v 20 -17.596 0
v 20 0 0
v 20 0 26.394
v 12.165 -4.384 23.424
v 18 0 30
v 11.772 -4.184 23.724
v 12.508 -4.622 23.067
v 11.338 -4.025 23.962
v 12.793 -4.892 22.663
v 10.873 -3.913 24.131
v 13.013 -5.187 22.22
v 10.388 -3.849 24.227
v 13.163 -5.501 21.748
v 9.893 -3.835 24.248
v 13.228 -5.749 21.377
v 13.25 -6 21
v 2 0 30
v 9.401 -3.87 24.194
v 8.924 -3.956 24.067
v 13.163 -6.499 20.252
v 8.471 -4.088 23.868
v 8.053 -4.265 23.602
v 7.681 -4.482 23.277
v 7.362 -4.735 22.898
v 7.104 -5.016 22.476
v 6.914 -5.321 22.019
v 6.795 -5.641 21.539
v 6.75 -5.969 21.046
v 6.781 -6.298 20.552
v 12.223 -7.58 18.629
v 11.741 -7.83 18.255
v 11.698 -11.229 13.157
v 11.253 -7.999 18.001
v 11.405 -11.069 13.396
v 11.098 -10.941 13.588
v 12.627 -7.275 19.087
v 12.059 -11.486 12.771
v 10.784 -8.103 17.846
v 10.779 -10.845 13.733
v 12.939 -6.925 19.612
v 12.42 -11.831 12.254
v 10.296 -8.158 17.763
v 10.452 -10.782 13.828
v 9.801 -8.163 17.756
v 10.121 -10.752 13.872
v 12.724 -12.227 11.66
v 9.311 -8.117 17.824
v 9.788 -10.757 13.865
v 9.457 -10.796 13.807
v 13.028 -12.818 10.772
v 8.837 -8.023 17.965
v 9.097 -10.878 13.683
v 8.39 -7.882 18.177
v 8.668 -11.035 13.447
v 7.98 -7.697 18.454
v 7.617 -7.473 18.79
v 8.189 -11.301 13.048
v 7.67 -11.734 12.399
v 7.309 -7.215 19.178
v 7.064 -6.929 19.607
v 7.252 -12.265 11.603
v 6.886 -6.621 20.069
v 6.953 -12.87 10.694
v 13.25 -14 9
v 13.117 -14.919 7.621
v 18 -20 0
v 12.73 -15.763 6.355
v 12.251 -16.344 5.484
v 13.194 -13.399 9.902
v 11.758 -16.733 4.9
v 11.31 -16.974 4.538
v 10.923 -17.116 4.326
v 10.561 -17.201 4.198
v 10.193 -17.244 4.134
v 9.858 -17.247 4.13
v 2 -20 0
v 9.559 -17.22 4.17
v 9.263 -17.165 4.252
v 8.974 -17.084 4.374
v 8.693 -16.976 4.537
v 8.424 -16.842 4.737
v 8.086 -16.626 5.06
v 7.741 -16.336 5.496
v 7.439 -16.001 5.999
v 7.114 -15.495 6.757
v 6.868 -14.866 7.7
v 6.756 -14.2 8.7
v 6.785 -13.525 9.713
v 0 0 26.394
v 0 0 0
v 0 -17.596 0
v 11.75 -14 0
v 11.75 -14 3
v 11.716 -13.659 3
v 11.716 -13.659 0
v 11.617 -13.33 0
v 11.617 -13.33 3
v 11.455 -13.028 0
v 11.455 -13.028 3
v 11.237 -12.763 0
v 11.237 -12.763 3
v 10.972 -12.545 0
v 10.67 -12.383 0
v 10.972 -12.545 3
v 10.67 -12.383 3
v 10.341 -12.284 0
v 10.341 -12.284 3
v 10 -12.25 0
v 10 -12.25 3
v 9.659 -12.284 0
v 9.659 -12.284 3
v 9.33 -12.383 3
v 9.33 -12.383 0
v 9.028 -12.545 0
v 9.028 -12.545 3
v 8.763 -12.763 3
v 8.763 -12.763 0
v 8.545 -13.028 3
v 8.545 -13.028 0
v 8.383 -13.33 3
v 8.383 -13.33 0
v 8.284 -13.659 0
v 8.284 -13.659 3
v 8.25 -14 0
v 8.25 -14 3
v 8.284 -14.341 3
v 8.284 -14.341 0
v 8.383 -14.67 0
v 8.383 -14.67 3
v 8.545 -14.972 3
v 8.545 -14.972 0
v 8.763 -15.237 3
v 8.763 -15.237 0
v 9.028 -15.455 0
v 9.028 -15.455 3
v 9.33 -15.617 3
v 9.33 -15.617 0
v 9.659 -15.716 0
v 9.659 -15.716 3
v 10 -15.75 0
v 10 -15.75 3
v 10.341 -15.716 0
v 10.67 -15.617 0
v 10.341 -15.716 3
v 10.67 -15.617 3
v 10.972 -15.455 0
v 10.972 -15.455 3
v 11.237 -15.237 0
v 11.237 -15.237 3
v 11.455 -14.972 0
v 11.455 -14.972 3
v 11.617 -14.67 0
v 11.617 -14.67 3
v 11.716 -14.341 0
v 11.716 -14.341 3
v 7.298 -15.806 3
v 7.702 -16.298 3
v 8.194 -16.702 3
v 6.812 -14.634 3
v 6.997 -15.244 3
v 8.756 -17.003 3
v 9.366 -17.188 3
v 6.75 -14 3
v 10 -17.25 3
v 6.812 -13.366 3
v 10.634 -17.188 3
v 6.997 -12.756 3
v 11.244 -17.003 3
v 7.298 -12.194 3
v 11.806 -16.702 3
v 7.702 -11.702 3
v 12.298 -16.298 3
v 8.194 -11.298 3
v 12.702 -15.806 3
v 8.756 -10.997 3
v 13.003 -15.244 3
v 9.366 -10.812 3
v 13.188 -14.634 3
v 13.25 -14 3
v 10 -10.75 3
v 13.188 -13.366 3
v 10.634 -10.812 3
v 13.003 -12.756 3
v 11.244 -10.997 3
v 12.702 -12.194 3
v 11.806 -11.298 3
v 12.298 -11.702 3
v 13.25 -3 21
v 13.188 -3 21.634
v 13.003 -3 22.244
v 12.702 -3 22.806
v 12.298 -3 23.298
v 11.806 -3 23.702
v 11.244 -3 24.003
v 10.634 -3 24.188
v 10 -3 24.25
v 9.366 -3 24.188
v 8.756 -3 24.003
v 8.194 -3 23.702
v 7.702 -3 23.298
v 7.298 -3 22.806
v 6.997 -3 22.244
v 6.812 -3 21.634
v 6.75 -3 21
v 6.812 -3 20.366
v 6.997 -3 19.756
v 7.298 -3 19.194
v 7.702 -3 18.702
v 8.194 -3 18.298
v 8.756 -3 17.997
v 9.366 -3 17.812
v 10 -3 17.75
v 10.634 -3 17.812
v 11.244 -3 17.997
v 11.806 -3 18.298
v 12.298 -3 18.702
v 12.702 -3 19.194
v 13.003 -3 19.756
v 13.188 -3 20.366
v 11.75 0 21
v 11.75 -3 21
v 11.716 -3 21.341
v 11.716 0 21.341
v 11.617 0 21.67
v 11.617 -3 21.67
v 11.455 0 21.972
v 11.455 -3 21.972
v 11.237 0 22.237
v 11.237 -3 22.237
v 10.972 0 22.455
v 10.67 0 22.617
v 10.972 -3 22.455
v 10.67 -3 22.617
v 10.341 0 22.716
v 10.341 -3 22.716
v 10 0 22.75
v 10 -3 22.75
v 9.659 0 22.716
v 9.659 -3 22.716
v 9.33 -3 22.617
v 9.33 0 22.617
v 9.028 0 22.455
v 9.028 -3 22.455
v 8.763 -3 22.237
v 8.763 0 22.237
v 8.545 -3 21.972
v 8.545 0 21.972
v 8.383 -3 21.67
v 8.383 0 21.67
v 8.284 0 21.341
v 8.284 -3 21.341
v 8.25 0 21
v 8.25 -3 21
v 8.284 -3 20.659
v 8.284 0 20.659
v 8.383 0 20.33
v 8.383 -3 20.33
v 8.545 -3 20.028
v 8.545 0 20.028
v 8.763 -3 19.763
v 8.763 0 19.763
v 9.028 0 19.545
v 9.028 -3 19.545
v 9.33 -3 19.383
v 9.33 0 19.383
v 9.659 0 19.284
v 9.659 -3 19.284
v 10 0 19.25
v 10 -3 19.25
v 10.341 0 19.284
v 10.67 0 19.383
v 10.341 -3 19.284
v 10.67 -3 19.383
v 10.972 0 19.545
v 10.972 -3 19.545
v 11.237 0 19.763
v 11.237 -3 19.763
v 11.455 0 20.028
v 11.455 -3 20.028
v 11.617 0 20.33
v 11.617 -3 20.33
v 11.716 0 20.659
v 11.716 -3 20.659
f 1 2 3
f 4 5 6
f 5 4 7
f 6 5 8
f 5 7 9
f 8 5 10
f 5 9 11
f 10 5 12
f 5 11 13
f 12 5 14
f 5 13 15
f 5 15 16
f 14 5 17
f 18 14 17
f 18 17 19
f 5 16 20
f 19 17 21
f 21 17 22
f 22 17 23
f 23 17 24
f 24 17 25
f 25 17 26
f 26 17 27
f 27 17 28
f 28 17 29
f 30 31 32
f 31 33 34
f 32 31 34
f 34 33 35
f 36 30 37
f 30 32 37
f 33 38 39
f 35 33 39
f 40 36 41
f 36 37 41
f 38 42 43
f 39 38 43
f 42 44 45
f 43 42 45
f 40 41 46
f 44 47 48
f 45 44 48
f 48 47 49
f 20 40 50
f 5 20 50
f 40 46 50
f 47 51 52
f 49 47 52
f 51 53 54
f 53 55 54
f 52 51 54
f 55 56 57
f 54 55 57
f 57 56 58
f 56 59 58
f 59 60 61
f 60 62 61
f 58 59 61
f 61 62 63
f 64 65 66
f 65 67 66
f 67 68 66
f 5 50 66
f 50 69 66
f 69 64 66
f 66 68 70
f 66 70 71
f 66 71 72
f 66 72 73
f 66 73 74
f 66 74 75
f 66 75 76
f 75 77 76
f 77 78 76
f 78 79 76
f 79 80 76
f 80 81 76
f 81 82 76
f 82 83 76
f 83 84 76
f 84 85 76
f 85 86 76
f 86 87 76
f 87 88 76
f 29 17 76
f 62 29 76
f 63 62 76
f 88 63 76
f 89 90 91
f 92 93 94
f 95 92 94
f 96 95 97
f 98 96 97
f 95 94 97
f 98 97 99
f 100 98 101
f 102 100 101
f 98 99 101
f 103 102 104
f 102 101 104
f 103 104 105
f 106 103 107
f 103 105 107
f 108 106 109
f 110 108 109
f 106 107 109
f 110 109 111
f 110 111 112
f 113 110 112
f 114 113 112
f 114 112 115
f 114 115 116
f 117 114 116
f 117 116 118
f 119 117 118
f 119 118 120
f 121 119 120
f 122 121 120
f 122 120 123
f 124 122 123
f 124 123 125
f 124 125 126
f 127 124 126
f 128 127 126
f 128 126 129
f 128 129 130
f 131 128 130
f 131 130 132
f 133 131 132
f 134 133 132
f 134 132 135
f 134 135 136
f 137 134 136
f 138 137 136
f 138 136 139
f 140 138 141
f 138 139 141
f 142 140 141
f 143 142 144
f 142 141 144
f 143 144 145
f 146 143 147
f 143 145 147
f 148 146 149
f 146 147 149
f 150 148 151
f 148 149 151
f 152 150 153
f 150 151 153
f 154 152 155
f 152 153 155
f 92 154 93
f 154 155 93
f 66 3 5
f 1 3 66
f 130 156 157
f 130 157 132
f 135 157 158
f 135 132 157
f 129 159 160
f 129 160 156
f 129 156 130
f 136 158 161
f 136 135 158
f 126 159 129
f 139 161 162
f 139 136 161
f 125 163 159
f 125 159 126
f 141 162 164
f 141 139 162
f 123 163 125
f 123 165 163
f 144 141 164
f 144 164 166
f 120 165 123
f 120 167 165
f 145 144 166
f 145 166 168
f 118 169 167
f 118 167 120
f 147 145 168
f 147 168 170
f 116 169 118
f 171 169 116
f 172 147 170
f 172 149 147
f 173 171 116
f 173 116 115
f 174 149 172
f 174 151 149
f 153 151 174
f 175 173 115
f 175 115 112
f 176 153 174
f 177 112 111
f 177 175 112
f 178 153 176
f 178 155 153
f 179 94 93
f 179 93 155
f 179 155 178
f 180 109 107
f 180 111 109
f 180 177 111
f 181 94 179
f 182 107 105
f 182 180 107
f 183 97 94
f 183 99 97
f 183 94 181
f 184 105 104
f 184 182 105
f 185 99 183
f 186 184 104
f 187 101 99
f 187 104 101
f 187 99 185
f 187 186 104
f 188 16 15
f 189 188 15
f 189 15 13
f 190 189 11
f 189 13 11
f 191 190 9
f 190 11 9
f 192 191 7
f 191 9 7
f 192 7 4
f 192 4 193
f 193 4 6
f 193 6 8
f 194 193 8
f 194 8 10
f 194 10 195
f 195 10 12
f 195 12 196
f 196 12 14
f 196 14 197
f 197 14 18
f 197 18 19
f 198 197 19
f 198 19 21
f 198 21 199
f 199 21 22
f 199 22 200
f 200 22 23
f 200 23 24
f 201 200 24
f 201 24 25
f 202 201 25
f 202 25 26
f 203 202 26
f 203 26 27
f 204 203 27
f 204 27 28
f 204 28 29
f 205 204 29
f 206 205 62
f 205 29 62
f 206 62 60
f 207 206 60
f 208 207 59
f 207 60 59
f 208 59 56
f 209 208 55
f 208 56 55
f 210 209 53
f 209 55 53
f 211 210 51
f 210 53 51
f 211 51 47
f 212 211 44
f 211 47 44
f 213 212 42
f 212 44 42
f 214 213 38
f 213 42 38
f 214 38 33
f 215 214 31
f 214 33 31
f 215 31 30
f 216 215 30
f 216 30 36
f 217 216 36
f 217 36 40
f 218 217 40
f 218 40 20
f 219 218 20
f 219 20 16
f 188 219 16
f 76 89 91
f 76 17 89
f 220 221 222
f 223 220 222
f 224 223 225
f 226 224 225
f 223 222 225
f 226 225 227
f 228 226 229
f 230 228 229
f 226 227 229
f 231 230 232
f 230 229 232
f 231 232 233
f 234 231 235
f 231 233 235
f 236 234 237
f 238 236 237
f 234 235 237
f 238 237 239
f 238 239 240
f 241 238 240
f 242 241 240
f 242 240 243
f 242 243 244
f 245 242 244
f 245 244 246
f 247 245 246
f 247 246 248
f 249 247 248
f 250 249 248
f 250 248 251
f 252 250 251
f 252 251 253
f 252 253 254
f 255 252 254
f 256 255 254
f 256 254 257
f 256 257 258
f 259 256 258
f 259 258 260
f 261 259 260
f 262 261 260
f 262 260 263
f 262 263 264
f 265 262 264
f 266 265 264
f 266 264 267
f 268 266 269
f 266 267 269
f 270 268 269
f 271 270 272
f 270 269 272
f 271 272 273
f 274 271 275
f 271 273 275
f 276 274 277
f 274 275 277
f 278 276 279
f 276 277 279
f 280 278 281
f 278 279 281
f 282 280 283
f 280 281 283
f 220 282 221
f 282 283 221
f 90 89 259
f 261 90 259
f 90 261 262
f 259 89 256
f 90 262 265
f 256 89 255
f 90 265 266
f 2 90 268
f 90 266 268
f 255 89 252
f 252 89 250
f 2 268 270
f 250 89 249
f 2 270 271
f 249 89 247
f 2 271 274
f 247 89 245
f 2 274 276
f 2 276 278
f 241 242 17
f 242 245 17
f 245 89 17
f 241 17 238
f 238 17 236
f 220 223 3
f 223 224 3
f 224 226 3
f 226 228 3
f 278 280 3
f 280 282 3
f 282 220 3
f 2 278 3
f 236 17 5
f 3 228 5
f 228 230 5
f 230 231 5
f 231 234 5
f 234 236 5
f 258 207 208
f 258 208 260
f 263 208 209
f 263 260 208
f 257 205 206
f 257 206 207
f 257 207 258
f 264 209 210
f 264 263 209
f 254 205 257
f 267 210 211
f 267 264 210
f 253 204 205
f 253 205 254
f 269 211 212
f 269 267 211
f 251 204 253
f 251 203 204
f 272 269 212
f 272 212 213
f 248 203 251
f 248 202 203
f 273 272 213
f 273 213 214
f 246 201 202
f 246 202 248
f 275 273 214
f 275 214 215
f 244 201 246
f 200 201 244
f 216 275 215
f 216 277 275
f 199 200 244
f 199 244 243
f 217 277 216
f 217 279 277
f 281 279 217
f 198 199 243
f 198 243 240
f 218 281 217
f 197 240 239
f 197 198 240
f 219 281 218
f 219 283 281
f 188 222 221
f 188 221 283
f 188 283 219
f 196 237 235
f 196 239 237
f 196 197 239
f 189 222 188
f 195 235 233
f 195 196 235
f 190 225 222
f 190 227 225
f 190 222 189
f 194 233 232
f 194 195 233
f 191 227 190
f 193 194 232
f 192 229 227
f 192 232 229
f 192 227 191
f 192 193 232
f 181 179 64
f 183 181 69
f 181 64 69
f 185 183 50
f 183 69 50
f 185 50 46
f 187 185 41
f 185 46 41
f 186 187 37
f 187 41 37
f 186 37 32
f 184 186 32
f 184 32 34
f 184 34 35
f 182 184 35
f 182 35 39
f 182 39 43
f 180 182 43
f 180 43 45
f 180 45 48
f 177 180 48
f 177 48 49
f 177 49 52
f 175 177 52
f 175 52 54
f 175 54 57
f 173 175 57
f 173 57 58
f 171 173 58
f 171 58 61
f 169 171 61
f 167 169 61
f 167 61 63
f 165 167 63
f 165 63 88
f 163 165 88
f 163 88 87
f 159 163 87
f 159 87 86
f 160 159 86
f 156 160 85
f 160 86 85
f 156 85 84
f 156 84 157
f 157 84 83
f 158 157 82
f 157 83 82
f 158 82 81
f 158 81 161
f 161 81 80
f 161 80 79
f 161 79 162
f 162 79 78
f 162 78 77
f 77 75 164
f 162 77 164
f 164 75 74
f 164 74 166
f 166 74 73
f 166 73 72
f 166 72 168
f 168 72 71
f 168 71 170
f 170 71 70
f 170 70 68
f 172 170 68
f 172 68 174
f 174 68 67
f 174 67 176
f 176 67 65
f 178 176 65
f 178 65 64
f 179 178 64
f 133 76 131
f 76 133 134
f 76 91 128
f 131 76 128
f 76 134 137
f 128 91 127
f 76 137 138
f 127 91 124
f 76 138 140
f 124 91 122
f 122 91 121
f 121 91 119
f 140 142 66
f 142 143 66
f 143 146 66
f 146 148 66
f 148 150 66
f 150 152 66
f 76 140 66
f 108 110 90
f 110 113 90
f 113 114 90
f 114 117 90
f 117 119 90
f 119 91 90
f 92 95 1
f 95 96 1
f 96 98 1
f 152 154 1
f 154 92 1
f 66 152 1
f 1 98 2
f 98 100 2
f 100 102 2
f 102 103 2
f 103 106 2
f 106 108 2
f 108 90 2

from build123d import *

# Parameters (mm, degrees)
F0_W     = 20
F0_H     = 30
F1_DEPTH = 20
F2_R     = 3.25
F2_R_2   = 1.75
F3_DEPTH = 17
F4_DEPTH = 20.001
F7_DEPTH = 20.001
F5_R     = 3.25
F5_R_2   = 1.75
F8_DEPTH = 27
F9_DEPTH = 30.001
F10_SIZE = 2


with BuildPart() as f1:
    # F0 (on Front) → F1 (new body)
    with BuildSketch(Plane.XZ):
        with Locations((10, 15)):
            Rectangle(F0_W, F0_H)
    extrude(amount=F1_DEPTH)

    # F2 (on face) → F3 (cut)
    with BuildSketch(Plane.XZ.offset(20)):
        with Locations((10, 21)):
            Circle(F2_R)
        with Locations((10, 21)):
            Circle(F2_R_2, mode=Mode.SUBTRACT)
    extrude(amount=-F3_DEPTH, mode=Mode.SUBTRACT)

    # F4 (cut, through all): a face of the model
    f4_faces = [f1.faces().sort_by_distance(p)[0] for p in [
        (10, -20, 21),
    ]]
    extrude(f4_faces, amount=-F4_DEPTH, mode=Mode.SUBTRACT)

    # F6 (on face) → F7 (cut, through all)
    with BuildSketch(Plane(origin=(0, 0, 0), x_dir=(0, -1, 0), z_dir=(-1, 0, 0))):
        Polygon((20, 30), (0, 30), (20, 0), align=None)
    extrude(amount=-F7_DEPTH, mode=Mode.SUBTRACT)

    # F5 (on face) → F8 (cut)
    with BuildSketch(Plane.XY.offset(30)):
        with Locations((10, -14)):
            Circle(F5_R)
        with Locations((10, -14)):
            Circle(F5_R_2, mode=Mode.SUBTRACT)
    extrude(amount=-F8_DEPTH, mode=Mode.SUBTRACT)

    # F5 (on face) → F9 (cut, through all)
    with BuildSketch(Plane.XY.offset(30)):
        with Locations((10, -14)):
            Circle(F5_R_2)
    extrude(amount=-F9_DEPTH, mode=Mode.SUBTRACT)

    # F10
    f10_edges = [f1.edges().sort_by_distance(p)[0] for p in [
        (0, -10, 15),
        (20, -10, 15),
    ]]
    chamfer(f10_edges, length=F10_SIZE)


solid = f1.part
